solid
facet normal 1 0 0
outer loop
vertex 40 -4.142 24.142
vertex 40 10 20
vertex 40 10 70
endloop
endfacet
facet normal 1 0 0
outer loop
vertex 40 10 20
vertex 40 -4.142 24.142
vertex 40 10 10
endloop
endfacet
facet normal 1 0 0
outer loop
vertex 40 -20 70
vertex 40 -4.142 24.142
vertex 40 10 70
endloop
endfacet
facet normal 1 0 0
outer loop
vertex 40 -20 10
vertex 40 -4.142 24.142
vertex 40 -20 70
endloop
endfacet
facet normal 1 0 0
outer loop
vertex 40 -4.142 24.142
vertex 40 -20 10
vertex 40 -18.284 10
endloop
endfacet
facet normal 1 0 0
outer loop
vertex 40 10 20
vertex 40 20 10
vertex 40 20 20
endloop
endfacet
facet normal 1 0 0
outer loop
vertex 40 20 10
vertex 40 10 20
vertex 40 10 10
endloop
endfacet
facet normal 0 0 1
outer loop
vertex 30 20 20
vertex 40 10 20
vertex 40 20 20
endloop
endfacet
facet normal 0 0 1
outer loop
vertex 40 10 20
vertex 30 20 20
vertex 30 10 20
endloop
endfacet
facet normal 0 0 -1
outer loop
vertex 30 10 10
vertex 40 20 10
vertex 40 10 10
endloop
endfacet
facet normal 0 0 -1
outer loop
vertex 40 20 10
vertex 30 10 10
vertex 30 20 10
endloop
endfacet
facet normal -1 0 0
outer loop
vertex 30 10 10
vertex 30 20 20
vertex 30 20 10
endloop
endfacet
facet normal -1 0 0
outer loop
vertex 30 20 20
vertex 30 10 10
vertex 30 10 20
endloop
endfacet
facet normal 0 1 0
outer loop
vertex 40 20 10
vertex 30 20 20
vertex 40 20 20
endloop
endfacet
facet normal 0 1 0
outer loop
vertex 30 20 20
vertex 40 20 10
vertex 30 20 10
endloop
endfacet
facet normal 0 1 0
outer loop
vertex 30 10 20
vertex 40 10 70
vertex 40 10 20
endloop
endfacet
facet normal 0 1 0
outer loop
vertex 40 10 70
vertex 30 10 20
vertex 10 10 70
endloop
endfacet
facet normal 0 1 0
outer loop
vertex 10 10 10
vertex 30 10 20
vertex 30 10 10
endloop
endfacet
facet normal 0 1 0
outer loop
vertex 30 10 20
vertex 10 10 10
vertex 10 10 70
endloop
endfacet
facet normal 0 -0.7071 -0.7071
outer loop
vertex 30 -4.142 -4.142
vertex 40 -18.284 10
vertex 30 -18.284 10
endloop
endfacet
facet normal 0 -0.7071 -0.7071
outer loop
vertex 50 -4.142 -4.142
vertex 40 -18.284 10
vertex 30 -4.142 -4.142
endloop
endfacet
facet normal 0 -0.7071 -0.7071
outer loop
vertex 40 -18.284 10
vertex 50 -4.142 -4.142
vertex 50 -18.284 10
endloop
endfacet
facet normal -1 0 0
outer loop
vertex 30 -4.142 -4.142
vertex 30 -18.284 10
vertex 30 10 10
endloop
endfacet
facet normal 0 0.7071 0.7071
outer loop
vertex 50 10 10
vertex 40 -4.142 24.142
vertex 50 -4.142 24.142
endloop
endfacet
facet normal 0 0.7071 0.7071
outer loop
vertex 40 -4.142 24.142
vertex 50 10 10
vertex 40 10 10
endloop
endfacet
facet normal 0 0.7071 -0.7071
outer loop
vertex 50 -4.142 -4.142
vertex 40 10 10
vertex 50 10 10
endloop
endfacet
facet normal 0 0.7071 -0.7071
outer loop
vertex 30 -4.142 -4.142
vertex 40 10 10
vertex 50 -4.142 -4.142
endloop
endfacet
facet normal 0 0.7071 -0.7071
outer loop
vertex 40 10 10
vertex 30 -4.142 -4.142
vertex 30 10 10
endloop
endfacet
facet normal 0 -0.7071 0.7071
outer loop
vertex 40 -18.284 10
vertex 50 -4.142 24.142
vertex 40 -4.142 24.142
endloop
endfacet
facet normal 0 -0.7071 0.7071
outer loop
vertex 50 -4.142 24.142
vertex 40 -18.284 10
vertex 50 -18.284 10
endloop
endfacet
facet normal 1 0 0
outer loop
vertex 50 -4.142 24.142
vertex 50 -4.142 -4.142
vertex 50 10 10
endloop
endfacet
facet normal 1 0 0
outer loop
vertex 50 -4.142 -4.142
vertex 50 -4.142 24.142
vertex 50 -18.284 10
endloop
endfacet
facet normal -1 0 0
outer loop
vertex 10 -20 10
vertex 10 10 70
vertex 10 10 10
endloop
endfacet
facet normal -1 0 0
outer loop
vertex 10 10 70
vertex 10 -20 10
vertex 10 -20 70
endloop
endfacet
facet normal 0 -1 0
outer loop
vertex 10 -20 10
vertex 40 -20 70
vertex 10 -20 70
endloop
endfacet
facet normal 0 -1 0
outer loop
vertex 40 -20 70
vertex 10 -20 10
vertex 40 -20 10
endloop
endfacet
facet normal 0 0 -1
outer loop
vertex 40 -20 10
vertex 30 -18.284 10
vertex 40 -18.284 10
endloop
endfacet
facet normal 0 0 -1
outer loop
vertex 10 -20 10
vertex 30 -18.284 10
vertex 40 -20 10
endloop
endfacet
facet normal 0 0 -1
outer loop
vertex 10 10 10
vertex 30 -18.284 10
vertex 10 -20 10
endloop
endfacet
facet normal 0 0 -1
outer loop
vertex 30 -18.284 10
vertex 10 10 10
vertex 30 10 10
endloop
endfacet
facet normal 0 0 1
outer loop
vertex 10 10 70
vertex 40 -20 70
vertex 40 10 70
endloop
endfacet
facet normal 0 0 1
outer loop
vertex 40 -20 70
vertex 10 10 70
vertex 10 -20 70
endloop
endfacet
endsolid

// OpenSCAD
// test children

module them(a)
{
    for (i = [0:$children-1]) {
	translate([10,10,10])
	    rotate([a*i,0,0])
	    children(i);
    }
}

them(45) {
    color("green") translate([20,0,0,]) cube(10);
    rotate([90,0,0]) translate([20,0,0]) color("blue") cube(20);
    color("red") scale([1,2,1]) cube(30);
}
